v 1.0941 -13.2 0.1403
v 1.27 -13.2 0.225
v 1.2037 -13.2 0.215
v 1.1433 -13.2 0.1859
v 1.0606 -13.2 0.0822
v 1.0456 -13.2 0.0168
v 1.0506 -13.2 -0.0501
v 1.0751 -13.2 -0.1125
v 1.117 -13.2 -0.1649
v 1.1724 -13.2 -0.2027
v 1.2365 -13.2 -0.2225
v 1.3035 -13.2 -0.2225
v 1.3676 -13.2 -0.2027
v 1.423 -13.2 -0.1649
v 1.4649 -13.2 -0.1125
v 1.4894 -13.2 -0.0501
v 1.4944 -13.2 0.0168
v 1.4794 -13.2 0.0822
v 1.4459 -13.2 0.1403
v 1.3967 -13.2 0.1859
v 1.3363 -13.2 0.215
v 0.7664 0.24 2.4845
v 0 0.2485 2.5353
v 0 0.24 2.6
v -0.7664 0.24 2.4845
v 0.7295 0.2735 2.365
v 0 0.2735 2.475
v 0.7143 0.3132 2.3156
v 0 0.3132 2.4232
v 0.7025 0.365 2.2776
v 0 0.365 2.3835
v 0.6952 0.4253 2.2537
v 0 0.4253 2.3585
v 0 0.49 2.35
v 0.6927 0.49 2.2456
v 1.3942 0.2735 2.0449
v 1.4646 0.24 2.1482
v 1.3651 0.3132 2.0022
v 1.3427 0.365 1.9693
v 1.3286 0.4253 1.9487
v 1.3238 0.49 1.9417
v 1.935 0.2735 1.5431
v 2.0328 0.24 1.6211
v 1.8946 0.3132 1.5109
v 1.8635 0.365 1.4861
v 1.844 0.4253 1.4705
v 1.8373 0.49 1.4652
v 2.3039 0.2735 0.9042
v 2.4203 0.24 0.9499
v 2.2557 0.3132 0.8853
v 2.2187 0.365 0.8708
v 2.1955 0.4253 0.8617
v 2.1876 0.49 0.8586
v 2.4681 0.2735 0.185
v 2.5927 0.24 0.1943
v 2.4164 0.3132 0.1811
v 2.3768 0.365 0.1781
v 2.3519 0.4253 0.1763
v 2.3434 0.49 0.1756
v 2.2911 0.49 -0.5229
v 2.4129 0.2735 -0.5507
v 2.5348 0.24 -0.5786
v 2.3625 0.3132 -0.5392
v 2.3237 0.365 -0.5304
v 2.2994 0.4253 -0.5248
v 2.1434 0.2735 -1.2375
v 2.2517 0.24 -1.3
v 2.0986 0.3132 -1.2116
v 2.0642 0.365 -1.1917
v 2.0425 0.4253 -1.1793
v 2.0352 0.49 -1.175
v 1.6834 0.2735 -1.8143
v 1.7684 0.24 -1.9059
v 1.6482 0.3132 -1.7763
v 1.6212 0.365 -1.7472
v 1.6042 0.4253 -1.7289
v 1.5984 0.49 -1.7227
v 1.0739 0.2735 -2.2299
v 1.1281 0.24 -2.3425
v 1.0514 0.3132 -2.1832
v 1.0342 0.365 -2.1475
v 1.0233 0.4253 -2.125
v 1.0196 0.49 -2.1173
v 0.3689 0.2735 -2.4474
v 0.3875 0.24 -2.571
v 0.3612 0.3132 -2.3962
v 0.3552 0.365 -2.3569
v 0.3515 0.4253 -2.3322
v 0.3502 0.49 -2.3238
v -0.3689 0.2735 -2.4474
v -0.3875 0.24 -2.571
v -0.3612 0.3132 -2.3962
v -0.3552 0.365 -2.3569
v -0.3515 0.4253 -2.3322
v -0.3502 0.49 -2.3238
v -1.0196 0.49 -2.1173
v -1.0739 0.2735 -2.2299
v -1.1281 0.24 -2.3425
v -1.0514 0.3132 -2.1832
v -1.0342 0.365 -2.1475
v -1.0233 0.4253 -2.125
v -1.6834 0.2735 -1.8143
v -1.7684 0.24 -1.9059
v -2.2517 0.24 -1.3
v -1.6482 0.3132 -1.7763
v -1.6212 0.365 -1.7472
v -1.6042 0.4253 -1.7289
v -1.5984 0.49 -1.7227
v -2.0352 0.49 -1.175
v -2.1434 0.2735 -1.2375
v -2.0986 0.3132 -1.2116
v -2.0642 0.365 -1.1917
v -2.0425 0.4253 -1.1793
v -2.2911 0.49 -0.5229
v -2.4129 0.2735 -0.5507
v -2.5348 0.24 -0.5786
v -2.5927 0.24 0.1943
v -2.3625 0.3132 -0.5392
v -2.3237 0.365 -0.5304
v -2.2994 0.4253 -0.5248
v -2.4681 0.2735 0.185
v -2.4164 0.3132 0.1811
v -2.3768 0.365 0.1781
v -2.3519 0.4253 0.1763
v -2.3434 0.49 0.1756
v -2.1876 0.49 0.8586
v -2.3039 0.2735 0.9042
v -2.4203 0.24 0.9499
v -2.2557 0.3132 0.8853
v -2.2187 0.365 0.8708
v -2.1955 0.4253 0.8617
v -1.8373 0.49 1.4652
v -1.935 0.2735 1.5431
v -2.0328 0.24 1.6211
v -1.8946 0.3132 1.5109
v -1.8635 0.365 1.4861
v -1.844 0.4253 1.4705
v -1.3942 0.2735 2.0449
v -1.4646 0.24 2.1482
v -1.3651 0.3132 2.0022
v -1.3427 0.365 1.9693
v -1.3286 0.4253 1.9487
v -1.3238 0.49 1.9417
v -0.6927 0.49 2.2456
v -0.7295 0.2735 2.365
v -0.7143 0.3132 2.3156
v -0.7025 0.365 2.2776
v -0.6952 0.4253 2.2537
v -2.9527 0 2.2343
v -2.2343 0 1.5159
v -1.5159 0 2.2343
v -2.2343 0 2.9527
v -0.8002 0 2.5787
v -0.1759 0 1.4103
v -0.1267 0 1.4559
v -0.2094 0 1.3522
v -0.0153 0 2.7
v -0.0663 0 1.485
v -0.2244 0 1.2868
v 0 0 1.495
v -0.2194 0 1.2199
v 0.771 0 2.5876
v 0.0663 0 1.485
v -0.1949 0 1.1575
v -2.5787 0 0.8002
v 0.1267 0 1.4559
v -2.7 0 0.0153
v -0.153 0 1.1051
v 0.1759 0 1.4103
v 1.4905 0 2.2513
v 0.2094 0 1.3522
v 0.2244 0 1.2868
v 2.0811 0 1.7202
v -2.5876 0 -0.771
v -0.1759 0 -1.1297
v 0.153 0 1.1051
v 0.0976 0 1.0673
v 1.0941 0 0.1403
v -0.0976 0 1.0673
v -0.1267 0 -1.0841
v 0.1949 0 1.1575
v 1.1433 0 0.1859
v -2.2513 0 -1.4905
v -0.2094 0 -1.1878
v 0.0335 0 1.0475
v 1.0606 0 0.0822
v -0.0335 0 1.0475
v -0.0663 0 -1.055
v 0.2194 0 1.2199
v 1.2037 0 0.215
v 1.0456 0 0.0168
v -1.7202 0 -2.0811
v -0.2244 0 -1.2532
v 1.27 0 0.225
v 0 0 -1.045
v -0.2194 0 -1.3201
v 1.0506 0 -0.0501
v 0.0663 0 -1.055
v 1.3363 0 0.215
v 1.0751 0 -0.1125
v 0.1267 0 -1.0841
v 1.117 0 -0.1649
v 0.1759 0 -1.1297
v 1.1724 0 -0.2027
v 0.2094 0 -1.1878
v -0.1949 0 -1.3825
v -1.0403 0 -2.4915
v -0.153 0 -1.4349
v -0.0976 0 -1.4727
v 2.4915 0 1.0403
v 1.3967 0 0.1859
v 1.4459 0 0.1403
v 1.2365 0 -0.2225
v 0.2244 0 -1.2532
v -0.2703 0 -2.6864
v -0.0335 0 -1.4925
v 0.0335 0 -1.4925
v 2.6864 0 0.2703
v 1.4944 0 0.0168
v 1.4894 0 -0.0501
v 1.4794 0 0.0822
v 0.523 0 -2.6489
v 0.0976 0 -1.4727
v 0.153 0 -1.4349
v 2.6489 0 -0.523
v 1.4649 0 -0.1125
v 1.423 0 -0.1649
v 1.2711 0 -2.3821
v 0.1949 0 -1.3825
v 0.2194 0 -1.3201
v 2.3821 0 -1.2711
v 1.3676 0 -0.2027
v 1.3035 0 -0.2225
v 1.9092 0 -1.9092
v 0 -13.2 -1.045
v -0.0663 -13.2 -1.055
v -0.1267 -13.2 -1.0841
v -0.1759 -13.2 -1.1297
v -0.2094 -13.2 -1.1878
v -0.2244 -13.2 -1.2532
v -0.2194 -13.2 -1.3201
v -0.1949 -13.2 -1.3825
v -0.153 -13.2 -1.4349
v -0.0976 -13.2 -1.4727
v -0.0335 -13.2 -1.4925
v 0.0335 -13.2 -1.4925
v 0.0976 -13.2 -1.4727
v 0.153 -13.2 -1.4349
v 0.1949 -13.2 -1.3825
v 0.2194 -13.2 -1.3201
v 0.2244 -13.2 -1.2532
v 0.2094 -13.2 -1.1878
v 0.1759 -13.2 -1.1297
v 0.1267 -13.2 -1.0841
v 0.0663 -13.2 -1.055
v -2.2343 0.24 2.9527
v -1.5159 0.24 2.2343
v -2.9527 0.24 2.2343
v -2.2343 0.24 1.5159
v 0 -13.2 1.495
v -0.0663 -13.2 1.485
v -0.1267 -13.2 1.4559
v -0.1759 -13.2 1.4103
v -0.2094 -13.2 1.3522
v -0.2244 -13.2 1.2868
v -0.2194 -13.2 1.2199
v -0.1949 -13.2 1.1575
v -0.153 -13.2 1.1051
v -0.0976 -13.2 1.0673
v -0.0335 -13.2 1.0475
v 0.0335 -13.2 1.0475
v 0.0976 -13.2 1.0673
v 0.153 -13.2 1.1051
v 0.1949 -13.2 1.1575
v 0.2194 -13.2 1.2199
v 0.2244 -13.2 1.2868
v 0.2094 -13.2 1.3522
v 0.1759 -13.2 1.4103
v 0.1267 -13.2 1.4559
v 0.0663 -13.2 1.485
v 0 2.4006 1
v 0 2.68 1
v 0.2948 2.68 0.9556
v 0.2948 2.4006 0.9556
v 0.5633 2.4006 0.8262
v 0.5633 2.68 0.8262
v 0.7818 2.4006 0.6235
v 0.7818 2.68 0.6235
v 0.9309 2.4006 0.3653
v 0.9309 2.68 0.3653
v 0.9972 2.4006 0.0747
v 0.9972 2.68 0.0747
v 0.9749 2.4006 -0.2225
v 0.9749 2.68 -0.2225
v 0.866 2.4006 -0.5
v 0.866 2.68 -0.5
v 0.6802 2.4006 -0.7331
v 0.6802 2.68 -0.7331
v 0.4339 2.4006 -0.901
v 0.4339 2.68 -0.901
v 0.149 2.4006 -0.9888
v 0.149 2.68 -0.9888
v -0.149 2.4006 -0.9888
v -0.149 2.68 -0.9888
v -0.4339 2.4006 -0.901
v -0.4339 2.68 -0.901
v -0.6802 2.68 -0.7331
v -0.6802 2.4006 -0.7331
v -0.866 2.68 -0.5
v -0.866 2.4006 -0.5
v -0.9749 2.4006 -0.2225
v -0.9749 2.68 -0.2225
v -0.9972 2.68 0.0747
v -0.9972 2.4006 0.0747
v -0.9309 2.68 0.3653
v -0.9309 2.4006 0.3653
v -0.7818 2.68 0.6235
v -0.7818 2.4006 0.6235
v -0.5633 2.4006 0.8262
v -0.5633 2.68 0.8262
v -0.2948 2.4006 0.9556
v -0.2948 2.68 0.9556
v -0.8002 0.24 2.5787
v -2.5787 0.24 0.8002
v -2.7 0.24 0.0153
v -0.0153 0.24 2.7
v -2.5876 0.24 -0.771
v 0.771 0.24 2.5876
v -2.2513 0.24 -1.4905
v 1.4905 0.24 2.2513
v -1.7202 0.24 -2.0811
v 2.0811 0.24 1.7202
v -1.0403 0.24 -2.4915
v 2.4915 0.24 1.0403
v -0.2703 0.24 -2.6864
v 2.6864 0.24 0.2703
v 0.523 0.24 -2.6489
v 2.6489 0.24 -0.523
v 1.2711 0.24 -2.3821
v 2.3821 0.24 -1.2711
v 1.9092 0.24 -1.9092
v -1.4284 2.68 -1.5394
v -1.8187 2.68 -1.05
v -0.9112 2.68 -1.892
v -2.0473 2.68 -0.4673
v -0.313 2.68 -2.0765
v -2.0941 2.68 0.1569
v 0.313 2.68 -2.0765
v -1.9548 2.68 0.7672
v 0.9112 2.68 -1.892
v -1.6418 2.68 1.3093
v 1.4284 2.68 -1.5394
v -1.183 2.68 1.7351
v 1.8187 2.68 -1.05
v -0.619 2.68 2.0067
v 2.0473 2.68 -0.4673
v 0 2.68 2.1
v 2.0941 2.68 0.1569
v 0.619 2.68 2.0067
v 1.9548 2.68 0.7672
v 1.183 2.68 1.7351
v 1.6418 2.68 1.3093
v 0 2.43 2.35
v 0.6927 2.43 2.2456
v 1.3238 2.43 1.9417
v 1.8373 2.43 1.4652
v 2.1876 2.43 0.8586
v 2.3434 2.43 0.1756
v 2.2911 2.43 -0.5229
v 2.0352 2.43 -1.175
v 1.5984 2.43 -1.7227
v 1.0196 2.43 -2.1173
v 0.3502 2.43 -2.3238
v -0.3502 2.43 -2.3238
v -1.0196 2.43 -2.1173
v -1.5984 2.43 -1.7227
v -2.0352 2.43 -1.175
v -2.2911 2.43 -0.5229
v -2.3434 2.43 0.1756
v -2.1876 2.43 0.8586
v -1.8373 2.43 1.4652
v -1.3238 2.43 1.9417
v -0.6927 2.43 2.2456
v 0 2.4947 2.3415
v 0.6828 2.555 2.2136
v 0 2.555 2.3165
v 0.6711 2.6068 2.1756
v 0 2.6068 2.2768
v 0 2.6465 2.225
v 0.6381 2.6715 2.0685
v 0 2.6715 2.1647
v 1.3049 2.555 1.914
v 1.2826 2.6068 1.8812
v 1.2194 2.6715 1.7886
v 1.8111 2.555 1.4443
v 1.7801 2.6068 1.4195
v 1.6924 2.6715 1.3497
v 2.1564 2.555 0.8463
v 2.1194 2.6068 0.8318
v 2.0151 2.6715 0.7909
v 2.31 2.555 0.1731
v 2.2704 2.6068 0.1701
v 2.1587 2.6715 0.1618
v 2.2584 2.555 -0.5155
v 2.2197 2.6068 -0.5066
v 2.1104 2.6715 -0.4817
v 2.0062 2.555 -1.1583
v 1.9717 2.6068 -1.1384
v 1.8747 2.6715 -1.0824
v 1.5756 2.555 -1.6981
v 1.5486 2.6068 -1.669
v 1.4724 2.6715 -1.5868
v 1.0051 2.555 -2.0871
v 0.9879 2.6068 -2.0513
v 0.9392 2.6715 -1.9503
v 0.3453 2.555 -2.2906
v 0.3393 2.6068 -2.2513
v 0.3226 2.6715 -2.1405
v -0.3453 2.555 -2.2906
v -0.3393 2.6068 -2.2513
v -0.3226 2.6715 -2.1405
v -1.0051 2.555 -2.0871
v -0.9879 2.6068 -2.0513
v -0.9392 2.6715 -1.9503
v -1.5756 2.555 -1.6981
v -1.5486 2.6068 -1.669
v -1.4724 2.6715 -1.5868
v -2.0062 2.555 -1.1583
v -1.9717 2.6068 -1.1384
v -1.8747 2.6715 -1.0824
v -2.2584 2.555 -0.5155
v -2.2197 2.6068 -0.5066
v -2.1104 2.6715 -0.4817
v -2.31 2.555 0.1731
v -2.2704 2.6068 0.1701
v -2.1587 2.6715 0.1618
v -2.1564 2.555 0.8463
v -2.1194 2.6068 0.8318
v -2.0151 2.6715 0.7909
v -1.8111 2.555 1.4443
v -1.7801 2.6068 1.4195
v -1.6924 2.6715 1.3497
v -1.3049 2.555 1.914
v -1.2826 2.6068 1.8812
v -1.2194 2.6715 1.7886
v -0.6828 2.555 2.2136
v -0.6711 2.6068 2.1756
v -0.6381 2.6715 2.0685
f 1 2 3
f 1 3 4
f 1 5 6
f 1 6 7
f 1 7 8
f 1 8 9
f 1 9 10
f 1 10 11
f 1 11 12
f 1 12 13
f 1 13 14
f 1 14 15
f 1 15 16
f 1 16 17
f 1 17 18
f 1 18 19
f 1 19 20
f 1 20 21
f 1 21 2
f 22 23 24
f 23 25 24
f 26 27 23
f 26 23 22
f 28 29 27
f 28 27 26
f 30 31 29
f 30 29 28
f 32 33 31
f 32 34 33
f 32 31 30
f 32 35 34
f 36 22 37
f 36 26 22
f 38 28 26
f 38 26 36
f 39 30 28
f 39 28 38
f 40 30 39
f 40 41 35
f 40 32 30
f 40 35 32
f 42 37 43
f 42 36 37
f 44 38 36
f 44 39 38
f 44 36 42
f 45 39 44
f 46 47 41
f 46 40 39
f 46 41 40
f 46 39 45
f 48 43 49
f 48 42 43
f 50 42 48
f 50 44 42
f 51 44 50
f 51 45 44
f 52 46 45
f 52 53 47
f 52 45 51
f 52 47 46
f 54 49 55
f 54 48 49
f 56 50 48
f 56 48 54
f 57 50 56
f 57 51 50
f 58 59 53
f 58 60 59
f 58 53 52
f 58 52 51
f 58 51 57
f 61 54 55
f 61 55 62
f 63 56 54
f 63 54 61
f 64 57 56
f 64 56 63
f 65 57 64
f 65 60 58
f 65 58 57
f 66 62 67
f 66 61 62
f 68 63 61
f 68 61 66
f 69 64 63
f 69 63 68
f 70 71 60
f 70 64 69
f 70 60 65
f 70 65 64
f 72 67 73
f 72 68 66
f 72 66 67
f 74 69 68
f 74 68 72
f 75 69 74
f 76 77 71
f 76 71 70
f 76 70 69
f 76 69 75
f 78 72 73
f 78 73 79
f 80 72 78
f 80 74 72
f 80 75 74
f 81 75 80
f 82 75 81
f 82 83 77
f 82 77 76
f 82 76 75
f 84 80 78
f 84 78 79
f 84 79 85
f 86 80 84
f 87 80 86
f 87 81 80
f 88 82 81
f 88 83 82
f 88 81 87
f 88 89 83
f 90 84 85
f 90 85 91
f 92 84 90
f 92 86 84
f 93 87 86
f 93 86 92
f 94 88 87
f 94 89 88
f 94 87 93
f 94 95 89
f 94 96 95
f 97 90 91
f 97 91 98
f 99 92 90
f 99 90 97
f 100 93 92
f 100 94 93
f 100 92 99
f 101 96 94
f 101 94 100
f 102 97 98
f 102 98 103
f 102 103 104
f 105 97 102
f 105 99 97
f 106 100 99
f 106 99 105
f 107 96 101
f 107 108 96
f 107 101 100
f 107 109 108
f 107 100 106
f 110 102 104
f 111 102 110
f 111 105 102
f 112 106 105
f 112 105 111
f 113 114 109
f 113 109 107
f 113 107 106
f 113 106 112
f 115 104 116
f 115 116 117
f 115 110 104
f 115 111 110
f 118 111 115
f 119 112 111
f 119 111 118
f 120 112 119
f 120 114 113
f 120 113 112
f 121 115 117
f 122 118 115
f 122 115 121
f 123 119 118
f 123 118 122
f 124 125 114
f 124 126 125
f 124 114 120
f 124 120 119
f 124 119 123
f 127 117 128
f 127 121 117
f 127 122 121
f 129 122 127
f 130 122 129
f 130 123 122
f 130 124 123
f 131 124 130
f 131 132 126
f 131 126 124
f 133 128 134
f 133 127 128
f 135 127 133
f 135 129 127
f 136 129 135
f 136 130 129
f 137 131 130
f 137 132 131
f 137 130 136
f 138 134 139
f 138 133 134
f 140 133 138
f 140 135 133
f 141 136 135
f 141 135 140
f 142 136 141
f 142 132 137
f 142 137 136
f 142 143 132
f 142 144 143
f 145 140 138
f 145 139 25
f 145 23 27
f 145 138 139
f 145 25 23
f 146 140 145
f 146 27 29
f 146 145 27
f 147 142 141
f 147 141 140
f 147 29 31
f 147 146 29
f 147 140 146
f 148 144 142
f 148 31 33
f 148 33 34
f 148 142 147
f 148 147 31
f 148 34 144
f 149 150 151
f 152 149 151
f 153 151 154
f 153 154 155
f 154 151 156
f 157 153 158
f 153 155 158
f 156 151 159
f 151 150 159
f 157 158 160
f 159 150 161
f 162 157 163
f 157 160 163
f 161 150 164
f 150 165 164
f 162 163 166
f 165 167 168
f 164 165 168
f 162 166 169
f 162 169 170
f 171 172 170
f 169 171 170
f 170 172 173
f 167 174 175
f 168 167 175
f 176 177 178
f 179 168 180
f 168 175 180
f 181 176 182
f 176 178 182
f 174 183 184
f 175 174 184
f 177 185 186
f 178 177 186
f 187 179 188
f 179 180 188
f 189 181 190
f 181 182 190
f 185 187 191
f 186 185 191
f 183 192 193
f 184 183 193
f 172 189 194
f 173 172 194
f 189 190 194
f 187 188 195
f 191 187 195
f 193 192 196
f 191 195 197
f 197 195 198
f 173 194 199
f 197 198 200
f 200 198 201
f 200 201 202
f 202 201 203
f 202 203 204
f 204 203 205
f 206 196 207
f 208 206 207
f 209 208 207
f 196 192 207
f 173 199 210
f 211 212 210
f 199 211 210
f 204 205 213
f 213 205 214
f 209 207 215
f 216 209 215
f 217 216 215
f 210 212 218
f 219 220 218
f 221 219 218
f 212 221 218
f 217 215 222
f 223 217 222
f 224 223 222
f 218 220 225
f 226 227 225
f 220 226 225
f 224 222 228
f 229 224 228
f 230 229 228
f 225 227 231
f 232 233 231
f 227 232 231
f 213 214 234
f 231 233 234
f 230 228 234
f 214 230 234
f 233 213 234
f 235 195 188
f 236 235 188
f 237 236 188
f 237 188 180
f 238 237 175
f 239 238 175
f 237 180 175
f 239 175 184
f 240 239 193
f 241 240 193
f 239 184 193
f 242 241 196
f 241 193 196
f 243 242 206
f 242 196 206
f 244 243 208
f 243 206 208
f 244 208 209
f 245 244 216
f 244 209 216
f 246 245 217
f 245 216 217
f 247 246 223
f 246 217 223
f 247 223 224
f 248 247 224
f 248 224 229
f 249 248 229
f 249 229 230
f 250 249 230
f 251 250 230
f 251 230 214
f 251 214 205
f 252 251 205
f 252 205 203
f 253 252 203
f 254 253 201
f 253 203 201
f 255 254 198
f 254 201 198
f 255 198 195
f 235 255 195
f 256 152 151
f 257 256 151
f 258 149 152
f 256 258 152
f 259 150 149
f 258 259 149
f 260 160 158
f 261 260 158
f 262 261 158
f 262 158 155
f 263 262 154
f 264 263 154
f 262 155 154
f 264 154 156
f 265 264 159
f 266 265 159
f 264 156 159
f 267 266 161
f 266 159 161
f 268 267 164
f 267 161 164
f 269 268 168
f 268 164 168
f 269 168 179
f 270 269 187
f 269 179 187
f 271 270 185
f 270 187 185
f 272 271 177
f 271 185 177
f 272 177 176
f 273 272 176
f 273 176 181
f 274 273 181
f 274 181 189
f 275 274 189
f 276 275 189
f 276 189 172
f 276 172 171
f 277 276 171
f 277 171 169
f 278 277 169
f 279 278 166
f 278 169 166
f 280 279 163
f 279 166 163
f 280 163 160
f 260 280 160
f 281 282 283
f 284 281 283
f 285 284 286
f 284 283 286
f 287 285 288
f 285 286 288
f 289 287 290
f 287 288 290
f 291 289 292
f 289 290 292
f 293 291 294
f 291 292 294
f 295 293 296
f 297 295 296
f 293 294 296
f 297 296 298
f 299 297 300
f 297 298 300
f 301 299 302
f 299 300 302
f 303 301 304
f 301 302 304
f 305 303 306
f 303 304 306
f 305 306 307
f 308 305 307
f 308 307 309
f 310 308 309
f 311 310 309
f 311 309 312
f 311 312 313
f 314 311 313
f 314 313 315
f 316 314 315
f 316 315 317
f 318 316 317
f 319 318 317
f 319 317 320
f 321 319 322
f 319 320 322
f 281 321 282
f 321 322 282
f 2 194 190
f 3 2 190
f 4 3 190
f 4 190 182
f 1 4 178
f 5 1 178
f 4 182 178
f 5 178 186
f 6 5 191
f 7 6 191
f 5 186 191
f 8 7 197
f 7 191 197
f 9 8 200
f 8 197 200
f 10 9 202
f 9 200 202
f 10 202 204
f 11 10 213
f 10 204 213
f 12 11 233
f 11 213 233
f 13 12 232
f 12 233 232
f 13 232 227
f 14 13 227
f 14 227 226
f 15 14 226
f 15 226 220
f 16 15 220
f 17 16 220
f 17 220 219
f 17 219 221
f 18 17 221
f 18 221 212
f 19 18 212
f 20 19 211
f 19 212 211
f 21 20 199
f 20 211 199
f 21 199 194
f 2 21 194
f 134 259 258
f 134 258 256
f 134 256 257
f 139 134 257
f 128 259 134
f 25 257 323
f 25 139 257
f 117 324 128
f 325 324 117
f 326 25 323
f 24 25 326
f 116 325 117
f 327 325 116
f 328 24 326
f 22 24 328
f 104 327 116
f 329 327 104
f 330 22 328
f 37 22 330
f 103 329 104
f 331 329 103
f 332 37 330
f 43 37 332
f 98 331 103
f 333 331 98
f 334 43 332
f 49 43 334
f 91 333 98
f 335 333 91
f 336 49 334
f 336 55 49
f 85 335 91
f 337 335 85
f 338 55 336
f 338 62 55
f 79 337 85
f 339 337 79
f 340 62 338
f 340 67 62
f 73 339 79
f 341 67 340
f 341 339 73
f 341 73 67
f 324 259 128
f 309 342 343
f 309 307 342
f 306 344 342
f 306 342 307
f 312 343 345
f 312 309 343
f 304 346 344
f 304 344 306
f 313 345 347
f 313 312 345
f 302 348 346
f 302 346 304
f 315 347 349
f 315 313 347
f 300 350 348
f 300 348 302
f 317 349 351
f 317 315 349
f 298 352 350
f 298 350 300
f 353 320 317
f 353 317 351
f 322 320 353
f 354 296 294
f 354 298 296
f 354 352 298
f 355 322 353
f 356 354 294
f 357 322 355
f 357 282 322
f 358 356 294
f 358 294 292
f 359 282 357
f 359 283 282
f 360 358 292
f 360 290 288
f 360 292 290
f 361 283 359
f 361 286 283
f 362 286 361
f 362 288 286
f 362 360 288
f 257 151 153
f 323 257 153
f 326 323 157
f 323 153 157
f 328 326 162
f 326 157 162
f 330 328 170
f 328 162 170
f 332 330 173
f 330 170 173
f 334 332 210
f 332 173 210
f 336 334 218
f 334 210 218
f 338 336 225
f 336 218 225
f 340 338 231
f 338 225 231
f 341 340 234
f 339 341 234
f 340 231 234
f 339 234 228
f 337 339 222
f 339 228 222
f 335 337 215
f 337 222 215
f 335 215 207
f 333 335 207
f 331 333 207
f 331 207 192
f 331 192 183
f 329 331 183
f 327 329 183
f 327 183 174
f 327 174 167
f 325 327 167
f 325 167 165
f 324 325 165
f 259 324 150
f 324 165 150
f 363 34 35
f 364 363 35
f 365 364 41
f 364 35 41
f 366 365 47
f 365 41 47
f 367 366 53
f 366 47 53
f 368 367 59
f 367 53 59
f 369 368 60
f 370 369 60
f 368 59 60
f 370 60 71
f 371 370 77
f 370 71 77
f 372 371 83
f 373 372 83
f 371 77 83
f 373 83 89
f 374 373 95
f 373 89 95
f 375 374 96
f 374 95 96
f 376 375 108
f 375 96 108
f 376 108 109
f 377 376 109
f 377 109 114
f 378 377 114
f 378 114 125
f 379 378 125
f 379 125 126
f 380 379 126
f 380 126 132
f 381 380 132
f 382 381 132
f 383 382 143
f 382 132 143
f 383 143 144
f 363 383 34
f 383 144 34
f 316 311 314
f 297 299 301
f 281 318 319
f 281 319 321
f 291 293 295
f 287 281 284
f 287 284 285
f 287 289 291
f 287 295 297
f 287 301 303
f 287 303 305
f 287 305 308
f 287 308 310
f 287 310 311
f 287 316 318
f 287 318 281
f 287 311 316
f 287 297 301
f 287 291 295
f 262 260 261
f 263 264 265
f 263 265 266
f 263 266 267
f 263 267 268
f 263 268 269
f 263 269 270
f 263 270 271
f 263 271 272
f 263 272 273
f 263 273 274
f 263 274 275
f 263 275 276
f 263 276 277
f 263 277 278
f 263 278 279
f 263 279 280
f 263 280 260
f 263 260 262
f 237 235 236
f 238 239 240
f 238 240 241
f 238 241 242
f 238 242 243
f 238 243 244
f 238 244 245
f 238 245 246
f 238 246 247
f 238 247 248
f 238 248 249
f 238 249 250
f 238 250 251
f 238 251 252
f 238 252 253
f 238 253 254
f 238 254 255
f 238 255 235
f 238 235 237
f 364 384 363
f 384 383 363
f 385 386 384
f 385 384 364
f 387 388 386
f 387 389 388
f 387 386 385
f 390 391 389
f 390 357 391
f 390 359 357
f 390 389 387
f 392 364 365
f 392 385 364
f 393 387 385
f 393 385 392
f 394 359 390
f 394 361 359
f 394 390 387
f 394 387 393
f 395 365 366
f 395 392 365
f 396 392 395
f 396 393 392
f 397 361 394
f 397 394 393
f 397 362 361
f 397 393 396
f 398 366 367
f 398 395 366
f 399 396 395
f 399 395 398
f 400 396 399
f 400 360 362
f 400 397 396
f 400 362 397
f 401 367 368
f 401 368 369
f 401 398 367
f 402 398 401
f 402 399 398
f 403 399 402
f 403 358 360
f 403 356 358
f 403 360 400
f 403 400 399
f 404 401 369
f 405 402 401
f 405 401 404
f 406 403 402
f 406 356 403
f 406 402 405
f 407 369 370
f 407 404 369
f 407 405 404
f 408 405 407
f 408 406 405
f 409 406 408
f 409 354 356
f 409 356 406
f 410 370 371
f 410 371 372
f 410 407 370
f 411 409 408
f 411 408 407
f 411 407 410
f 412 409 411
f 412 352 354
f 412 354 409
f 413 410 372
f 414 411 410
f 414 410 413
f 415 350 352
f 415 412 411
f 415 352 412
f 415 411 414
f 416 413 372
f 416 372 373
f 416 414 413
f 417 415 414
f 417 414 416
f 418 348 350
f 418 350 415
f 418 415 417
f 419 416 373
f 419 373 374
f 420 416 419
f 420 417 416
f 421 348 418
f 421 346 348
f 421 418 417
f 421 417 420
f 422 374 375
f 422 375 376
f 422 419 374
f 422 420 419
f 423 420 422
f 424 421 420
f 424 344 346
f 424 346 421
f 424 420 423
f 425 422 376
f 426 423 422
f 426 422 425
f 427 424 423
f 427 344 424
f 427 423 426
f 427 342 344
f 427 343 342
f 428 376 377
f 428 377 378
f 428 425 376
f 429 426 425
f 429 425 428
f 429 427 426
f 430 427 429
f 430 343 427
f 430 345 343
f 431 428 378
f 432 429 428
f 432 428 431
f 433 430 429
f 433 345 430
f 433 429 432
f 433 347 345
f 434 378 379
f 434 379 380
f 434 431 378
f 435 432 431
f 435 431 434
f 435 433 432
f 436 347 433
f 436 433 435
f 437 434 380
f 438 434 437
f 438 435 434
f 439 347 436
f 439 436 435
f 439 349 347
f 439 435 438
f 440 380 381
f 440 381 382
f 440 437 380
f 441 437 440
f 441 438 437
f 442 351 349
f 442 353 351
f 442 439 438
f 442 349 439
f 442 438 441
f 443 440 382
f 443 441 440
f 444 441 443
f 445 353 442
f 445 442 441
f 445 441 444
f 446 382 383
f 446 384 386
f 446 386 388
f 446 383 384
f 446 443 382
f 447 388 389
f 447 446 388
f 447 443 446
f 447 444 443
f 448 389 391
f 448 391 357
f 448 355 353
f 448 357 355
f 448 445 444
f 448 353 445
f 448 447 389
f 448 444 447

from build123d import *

# Parameters (mm, degrees)
BOSS_EXTRUDE1_DEPTH = 0.24
SKETCH3_R           = 2.35
BOSS_EXTRUDE2_DEPTH = 2.44
SKETCH4_R           = 1
CUT_EXTRUDE1_DEPTH  = 0.2794
SKETCH6_R           = 0.225
BOSS_EXTRUDE3_DEPTH = 13.2
FILLET1_R           = 0.25


with BuildPart() as part:
    # Sketch1 → Boss-Extrude1 (new body)
    with BuildSketch(Plane(origin=(0, 0, 0), x_dir=(1, 0, 0), z_dir=(0, 1, 0))):
        with BuildLine():
            Line((-2.234301709, -1.51588122), (-2.952722199, -2.234301709))
            Line((-2.952722199, -2.234301709), (-2.234301709, -2.952722199))
            Line((-2.234301709, -2.952722199), (-1.51588122, -2.234301709))
            ThreePointArc((-1.51588122, -2.234301709), (1.909188309, 1.909188309), (-2.234301709, -1.51588122))
        make_face()
    extrude(amount=BOSS_EXTRUDE1_DEPTH)

    # Sketch3 → Boss-Extrude2 (add)
    with BuildSketch(Plane(origin=(0, 0.24, 0), x_dir=(1, 0, 0), z_dir=(0, 1, 0))):
        with Locations(Location((0, 0, 0), (0, 0, 270))):  # turned: the seam where the file's is
            Circle(SKETCH3_R)
    extrude(amount=BOSS_EXTRUDE2_DEPTH)

    # Sketch4 → Cut-Extrude1 (cut)
    with BuildSketch(Plane(origin=(0, 2.68, 0), x_dir=(1, 0, 0), z_dir=(0, 1, 0))):
        with Locations(Location((0, 0, 0), (0, 0, 270))):  # turned: the seam where the file's is
            Circle(SKETCH4_R)
    extrude(amount=-CUT_EXTRUDE1_DEPTH, mode=Mode.SUBTRACT)

    # Sketch6 → Boss-Extrude3 (add)
    with BuildSketch(Plane.XZ):
        with Locations(Location((0, 1.27, 0), (0, 0, 90))):  # turned: the seam where the file's is
            Circle(SKETCH6_R)
        with Locations(Location((0, -1.27, 0), (0, 0, 90))):  # turned: the seam where the file's is
            Circle(SKETCH6_R)
        with Locations(Location((1.27, 0, 0), (0, 0, 90))):  # turned: the seam where the file's is
            Circle(SKETCH6_R)
    extrude(amount=BOSS_EXTRUDE3_DEPTH)

    # Fillet1
    fillet1_edges = [part.edges().sort_by_distance(p)[0] for p in [
        (0, 0.24, -2.35),
        (0, 2.68, -2.35),
    ]]
    fillet(fillet1_edges, radius=FILLET1_R)


solid = part.part
